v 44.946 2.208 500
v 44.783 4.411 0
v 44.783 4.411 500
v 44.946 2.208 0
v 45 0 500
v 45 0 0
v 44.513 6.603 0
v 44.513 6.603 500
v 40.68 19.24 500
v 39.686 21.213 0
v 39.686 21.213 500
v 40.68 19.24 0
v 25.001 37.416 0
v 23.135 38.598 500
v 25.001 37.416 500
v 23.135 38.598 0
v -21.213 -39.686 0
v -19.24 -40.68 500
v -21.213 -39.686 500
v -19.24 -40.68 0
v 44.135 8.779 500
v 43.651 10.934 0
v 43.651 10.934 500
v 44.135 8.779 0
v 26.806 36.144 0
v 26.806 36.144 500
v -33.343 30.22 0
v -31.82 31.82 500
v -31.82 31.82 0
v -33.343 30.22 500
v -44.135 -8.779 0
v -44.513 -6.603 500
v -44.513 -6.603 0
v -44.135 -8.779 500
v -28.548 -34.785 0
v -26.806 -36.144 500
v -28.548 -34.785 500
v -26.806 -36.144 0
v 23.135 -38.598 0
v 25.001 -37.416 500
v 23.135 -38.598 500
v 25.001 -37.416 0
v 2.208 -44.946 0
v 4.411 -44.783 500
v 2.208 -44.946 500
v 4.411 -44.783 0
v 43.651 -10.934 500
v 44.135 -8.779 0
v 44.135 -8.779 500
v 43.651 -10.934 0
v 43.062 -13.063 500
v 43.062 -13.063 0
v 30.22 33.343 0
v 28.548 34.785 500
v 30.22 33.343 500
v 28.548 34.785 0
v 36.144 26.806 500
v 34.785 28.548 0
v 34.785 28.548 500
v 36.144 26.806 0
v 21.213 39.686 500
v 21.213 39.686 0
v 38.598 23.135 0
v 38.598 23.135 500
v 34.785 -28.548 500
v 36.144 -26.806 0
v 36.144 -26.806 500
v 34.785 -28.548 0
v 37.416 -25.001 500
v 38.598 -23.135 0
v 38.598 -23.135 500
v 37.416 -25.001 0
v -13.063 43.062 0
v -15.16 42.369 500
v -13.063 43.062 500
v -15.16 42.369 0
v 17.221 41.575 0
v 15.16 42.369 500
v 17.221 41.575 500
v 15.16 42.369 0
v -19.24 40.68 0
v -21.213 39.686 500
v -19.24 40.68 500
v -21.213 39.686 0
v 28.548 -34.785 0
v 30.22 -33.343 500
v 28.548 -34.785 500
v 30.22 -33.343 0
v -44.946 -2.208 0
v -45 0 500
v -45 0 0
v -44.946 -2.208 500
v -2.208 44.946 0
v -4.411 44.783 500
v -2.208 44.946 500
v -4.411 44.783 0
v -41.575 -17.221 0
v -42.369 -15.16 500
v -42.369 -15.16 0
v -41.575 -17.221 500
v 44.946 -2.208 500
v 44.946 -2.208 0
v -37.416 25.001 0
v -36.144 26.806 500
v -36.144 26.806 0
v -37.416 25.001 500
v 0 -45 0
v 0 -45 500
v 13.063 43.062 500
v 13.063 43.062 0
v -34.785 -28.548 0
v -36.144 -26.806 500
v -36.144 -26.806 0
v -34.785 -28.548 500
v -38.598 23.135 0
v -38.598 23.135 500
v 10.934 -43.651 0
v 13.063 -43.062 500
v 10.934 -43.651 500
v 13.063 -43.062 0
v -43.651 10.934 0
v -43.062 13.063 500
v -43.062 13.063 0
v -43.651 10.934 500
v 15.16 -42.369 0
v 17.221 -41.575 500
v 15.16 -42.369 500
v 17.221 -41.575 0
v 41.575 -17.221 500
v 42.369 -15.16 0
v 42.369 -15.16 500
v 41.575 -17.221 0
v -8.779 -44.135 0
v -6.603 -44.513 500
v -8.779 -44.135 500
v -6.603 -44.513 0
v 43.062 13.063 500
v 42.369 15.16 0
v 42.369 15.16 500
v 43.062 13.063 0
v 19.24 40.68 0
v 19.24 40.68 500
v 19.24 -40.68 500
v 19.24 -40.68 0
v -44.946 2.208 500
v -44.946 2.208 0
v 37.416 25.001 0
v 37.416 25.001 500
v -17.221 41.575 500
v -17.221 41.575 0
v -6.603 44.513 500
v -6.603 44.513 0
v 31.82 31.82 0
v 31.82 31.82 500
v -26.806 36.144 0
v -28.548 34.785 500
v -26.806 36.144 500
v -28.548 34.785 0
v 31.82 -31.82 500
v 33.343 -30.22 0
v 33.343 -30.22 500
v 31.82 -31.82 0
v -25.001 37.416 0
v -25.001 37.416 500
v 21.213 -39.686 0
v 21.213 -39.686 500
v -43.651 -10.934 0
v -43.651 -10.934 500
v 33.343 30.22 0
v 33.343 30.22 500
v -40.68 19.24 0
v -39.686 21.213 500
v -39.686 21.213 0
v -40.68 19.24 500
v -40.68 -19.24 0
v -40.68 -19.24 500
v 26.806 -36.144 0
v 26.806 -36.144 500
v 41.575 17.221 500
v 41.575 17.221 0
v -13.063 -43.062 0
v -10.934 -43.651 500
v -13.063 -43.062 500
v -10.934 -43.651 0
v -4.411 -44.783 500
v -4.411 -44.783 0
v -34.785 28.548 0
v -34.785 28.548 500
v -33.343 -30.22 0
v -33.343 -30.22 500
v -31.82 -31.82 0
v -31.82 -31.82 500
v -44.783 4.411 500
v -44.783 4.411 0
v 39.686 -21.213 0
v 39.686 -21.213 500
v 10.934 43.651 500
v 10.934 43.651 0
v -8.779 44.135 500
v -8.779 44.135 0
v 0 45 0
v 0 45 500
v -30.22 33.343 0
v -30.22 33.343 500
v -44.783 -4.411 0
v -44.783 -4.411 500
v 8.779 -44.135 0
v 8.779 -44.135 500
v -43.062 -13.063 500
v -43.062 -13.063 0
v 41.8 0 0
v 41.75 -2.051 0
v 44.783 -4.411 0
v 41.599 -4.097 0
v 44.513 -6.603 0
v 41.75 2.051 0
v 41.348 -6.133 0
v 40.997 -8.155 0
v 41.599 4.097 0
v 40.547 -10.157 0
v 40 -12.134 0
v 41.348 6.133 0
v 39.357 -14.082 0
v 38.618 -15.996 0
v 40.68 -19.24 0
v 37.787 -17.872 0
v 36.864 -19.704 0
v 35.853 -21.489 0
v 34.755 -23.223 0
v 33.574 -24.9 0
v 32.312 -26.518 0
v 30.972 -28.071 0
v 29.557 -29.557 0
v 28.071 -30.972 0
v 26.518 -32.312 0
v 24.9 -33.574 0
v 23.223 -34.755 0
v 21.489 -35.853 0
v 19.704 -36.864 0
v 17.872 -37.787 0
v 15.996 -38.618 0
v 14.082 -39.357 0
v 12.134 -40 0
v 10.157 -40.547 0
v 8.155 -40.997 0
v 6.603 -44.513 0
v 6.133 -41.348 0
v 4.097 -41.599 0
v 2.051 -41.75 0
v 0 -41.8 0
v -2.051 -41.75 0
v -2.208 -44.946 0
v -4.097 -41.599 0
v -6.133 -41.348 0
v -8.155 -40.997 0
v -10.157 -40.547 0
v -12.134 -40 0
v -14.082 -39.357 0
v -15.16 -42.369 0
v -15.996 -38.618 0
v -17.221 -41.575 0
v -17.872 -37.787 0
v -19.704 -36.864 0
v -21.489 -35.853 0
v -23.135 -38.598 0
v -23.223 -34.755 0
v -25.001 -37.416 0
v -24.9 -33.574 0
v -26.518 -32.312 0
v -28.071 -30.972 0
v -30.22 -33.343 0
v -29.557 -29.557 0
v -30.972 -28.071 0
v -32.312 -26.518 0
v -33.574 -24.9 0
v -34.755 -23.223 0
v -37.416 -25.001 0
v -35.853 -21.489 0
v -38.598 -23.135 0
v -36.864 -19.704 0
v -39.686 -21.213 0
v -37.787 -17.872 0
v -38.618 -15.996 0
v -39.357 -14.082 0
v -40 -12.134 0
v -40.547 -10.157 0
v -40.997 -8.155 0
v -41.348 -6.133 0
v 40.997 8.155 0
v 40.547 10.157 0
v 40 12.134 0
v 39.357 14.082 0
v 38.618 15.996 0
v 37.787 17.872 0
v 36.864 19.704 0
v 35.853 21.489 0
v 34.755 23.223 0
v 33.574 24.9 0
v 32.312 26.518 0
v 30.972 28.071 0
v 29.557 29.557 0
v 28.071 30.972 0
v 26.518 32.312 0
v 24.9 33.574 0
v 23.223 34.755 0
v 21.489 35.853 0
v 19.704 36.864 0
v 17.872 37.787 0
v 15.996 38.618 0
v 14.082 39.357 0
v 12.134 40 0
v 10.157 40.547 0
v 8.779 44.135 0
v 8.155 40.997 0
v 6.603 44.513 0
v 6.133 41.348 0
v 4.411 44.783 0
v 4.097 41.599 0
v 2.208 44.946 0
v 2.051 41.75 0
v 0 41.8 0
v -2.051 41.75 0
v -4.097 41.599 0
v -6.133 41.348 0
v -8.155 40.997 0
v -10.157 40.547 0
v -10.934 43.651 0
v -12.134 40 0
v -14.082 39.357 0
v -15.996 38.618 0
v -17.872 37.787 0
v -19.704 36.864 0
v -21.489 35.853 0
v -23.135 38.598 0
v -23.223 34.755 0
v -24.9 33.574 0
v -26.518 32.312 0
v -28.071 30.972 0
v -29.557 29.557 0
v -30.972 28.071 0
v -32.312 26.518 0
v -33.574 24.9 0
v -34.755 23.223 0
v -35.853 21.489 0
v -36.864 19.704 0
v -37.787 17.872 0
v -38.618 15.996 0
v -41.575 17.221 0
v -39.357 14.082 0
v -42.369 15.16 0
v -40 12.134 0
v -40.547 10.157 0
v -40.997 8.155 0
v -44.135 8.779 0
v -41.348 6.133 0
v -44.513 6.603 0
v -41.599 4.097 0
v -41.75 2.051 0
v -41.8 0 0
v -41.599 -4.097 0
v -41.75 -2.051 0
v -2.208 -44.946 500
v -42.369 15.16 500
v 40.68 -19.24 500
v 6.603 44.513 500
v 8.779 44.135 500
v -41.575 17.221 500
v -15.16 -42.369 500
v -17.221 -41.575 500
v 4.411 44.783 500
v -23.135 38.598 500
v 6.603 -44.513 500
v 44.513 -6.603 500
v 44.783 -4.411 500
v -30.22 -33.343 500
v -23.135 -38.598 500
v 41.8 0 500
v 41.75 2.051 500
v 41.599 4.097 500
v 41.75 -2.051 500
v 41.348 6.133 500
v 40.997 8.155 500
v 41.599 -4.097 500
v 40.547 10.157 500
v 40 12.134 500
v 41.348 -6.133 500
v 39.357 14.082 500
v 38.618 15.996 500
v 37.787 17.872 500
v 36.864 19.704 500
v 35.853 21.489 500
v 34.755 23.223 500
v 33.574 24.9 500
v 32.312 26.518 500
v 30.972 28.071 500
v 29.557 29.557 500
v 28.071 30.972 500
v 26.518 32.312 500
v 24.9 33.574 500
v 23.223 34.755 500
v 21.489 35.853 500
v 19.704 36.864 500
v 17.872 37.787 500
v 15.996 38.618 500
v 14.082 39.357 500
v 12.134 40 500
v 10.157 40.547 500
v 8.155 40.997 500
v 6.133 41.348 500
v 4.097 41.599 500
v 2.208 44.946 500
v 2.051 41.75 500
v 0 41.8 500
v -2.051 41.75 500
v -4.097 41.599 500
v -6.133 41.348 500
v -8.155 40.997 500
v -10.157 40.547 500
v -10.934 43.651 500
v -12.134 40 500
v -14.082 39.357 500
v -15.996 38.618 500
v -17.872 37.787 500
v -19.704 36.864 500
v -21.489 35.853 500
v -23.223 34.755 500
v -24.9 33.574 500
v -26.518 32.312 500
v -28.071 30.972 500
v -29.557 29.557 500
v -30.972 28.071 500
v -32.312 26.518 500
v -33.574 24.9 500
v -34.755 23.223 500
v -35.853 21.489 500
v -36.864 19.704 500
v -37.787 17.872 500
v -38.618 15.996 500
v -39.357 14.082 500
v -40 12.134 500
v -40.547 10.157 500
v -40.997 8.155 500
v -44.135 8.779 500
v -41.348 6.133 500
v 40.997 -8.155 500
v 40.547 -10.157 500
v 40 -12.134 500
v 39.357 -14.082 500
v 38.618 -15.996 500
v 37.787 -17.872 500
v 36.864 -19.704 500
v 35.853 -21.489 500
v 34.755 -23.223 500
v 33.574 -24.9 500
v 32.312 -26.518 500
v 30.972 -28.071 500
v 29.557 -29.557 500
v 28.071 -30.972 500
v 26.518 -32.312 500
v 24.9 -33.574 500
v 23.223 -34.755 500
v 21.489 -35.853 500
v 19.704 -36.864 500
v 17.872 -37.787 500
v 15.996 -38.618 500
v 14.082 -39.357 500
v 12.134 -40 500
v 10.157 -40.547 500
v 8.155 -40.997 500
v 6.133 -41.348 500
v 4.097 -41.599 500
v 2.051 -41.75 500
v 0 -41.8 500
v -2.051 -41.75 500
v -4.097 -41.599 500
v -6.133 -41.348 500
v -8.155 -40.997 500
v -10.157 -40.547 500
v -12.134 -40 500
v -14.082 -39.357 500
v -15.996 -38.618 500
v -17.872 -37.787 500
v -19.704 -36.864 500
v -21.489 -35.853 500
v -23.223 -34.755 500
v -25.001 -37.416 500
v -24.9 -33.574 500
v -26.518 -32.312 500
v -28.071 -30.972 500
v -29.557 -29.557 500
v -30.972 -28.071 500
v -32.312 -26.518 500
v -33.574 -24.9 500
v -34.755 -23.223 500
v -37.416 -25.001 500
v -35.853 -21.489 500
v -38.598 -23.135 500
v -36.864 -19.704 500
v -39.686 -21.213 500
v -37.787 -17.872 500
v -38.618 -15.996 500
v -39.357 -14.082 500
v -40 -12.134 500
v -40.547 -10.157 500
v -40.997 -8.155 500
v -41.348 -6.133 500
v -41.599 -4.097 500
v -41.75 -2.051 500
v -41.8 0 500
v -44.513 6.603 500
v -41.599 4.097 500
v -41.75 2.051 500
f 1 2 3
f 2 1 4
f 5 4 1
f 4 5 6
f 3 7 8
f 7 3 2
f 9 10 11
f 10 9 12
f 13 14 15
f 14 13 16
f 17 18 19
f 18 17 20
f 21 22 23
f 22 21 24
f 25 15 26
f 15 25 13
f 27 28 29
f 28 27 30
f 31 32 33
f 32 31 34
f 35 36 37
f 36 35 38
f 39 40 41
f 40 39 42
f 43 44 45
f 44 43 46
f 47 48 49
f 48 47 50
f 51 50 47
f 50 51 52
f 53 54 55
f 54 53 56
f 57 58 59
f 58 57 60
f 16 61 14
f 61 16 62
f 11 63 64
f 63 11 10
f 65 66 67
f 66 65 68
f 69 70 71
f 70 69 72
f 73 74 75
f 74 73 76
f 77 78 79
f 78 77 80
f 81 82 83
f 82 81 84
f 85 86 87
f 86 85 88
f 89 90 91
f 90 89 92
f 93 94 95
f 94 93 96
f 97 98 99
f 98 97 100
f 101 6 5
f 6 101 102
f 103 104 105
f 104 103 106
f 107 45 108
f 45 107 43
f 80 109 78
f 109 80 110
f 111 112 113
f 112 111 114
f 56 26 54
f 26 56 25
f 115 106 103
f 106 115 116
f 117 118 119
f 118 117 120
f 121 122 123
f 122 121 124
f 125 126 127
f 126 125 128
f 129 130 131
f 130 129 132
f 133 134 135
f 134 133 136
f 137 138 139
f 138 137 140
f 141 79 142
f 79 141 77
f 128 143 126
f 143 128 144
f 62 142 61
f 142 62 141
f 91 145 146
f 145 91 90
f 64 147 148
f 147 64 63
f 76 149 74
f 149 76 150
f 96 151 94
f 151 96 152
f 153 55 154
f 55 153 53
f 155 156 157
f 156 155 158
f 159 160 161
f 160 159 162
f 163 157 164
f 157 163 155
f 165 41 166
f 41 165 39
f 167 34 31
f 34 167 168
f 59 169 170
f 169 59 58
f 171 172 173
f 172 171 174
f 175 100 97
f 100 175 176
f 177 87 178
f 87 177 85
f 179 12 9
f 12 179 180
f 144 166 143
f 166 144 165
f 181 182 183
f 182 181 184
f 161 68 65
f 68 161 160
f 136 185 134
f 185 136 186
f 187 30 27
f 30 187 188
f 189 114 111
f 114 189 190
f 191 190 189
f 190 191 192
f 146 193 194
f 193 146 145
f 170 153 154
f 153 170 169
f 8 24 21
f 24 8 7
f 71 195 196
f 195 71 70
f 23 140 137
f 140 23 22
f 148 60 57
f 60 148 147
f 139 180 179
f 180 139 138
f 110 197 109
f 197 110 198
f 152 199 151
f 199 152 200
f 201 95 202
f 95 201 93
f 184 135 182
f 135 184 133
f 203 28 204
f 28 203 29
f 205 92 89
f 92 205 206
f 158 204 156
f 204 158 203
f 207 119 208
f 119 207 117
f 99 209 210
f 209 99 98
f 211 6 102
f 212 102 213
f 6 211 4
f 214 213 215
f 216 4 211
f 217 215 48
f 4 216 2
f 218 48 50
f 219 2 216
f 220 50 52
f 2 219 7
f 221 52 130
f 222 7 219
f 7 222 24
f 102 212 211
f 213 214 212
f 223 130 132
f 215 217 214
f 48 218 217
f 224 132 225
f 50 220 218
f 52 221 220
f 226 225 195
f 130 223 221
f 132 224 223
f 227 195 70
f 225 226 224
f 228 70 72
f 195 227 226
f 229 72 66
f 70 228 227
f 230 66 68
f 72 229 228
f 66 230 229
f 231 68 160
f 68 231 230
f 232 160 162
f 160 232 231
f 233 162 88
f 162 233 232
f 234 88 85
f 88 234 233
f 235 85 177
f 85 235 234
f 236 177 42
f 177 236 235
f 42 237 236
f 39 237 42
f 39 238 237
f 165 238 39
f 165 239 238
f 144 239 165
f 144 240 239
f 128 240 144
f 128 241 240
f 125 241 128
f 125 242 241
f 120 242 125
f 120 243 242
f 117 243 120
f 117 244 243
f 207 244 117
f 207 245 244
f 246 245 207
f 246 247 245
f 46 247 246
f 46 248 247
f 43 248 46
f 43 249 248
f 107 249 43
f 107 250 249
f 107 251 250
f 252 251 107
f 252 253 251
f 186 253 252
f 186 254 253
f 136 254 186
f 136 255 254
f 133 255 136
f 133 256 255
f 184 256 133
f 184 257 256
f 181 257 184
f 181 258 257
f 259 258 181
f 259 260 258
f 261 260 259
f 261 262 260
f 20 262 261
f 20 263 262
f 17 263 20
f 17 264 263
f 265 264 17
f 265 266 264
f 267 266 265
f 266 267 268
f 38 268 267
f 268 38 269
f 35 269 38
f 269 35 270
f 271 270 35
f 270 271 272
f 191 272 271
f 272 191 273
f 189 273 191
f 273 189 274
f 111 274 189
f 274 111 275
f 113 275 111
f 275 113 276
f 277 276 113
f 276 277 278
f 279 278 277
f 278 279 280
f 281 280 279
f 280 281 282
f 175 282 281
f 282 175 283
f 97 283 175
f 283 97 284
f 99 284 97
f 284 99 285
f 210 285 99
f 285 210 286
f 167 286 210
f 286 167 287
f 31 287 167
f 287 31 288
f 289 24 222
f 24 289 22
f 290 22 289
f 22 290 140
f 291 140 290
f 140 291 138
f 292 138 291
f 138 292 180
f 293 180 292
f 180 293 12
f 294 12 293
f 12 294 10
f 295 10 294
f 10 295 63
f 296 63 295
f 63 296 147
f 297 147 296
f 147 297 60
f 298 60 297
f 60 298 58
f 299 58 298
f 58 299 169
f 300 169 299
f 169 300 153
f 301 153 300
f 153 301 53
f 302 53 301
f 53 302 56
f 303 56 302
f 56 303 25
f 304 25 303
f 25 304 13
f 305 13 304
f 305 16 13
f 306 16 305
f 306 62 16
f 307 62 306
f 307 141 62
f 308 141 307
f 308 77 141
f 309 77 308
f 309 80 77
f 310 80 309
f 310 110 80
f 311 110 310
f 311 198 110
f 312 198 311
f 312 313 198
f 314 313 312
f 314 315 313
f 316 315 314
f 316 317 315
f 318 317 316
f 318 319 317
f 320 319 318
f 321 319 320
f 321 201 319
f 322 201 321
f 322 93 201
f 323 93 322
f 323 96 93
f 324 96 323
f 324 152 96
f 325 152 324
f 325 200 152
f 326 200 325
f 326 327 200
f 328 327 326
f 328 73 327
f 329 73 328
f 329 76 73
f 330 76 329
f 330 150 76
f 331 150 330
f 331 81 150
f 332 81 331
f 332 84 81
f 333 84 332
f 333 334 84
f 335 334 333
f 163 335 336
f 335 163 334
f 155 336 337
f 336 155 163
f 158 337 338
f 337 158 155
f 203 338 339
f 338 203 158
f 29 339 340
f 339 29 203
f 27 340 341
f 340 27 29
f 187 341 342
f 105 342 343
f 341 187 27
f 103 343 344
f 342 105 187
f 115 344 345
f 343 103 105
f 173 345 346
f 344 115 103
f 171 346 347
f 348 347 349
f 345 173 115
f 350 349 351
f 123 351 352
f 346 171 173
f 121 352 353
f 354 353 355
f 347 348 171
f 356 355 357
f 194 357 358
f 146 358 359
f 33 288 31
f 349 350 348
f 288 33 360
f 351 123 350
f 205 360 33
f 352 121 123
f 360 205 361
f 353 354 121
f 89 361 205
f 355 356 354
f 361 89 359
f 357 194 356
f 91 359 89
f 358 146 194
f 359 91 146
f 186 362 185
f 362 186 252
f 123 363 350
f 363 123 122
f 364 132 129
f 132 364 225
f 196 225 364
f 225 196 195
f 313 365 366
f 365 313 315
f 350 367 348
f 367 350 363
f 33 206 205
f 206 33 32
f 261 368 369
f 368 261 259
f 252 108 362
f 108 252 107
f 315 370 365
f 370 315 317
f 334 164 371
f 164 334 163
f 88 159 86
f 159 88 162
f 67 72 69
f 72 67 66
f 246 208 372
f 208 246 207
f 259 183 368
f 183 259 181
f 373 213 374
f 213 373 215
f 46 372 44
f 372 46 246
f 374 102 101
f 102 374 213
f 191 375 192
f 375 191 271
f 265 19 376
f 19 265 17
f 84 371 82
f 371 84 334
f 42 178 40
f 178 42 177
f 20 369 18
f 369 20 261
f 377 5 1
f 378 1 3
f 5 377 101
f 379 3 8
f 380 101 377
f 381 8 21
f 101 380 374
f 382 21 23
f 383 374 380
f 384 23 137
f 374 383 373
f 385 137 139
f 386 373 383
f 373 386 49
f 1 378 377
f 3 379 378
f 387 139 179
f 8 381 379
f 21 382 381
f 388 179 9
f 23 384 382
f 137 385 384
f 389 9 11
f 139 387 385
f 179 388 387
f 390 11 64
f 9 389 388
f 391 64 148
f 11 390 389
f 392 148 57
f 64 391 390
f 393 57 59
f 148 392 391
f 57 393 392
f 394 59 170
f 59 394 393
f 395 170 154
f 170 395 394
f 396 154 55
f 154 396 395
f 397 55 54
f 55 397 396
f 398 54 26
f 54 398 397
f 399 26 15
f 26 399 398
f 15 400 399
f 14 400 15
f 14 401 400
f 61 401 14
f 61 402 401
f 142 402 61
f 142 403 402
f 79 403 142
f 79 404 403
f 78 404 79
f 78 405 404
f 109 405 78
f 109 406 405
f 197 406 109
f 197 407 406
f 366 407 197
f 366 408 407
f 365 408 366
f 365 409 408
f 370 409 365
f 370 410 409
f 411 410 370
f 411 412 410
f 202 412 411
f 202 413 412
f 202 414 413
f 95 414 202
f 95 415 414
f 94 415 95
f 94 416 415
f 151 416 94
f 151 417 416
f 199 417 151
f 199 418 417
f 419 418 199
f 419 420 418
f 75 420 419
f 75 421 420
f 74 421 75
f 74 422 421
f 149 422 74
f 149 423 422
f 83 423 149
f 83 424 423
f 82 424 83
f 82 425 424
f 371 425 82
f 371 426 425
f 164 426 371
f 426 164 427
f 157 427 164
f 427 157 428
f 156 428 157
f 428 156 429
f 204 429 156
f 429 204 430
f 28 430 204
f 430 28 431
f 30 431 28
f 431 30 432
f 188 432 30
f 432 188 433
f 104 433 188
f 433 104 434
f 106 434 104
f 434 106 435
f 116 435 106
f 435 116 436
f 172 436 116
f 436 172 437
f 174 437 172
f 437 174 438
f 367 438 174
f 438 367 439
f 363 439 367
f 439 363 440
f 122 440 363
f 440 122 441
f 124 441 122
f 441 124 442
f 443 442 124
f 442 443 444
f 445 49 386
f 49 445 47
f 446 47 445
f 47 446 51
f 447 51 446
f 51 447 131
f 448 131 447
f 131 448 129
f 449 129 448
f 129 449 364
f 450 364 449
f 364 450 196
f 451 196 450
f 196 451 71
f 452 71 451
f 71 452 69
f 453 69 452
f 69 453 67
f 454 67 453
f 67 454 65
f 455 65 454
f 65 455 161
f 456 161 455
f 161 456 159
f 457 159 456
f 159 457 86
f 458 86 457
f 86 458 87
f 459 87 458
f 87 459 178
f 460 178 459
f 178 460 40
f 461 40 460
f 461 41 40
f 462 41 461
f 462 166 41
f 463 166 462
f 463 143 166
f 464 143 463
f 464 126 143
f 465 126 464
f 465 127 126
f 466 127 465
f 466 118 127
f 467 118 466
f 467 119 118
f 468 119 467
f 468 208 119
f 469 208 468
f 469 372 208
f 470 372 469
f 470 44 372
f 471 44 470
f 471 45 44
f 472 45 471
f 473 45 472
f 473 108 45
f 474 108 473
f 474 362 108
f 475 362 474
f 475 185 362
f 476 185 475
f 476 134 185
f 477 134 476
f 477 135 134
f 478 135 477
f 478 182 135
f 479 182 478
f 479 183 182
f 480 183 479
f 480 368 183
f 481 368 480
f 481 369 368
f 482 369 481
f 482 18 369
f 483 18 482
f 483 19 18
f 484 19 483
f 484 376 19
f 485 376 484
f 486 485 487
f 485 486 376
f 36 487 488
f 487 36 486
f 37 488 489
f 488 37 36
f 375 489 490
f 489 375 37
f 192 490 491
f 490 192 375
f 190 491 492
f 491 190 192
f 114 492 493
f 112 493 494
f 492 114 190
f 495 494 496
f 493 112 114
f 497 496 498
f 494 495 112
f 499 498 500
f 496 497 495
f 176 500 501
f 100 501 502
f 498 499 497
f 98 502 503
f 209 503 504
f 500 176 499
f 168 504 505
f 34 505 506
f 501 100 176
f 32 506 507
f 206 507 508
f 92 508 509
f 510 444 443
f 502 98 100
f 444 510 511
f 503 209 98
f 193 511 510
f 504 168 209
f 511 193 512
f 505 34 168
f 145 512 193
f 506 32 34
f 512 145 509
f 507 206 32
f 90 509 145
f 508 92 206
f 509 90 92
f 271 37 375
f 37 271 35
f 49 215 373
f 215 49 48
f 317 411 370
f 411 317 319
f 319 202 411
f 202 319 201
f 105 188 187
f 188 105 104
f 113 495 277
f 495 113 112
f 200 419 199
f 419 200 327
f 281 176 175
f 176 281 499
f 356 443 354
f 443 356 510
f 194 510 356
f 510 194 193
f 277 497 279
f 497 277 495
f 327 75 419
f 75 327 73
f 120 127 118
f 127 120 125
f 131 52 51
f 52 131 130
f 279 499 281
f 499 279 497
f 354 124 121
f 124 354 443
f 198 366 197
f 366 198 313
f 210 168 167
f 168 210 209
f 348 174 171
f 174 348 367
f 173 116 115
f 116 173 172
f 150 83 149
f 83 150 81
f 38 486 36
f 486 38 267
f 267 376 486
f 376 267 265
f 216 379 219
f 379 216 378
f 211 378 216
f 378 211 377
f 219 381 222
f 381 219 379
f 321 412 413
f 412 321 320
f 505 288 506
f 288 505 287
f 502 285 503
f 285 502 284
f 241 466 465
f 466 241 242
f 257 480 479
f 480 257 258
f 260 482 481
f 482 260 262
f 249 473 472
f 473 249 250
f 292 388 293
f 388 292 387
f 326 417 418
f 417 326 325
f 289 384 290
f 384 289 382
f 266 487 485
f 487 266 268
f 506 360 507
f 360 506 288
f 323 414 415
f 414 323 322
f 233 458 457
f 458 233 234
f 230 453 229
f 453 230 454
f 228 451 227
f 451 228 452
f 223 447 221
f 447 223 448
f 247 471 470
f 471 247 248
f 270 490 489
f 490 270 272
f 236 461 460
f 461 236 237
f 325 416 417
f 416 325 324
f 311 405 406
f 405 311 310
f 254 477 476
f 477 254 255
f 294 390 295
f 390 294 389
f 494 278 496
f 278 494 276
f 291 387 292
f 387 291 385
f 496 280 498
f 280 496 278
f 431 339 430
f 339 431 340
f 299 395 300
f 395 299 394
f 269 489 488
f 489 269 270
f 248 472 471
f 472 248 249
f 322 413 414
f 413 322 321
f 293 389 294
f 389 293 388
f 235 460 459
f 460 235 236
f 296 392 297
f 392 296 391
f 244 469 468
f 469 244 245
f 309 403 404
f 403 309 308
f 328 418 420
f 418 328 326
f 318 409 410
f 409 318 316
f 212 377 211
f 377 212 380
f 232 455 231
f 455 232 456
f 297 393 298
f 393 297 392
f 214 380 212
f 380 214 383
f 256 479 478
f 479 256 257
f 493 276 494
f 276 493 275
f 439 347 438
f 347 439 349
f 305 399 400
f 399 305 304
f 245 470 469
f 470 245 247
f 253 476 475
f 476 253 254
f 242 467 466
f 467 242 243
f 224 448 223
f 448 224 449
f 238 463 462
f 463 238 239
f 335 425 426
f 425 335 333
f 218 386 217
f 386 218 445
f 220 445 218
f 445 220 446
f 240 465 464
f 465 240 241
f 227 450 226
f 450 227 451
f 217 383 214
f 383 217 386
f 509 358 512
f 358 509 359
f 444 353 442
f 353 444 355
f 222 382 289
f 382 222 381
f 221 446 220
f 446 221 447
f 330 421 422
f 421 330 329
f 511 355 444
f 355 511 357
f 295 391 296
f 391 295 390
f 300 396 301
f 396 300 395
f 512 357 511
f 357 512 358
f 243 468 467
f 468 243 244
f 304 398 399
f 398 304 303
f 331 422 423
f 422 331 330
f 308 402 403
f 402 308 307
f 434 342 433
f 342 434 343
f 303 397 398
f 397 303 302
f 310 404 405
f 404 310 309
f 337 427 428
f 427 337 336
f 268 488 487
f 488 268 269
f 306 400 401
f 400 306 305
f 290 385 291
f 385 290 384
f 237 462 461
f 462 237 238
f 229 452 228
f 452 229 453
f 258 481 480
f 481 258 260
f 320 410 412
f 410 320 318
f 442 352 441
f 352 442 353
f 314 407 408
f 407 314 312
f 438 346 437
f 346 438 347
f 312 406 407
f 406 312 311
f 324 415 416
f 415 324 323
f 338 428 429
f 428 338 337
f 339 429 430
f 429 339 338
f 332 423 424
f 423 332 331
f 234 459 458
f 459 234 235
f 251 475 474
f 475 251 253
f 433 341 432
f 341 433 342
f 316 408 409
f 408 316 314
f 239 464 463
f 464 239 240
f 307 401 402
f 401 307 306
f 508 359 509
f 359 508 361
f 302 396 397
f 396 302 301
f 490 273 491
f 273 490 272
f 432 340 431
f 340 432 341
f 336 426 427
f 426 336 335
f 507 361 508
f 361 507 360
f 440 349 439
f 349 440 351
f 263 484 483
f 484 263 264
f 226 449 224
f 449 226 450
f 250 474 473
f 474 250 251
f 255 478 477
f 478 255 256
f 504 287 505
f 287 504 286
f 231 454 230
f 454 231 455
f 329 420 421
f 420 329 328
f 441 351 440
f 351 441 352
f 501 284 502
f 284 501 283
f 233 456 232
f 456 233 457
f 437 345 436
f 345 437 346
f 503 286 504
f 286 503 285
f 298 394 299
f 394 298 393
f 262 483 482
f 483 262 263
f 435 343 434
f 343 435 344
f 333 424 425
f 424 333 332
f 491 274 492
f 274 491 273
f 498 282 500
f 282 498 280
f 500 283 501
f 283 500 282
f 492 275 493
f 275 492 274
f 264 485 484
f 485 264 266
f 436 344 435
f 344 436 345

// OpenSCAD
$fn = 128;

// HT 90 pipe 500 mm (approximation)
// Dimensions in mm
pipe_length = 500;
outer_diameter = 90;
wall_thickness = 3.2;   // typical HT pipe wall thickness (approx)
inner_diameter = outer_diameter - 2*wall_thickness;

module ht_pipe(len=pipe_length, od=outer_diameter, id=inner_diameter) {
    difference() {
        cylinder(h=len, d=od, center=false);
        translate([0,0,-0.5])
            cylinder(h=len+1, d=id, center=false);
    }
}

ht_pipe();
